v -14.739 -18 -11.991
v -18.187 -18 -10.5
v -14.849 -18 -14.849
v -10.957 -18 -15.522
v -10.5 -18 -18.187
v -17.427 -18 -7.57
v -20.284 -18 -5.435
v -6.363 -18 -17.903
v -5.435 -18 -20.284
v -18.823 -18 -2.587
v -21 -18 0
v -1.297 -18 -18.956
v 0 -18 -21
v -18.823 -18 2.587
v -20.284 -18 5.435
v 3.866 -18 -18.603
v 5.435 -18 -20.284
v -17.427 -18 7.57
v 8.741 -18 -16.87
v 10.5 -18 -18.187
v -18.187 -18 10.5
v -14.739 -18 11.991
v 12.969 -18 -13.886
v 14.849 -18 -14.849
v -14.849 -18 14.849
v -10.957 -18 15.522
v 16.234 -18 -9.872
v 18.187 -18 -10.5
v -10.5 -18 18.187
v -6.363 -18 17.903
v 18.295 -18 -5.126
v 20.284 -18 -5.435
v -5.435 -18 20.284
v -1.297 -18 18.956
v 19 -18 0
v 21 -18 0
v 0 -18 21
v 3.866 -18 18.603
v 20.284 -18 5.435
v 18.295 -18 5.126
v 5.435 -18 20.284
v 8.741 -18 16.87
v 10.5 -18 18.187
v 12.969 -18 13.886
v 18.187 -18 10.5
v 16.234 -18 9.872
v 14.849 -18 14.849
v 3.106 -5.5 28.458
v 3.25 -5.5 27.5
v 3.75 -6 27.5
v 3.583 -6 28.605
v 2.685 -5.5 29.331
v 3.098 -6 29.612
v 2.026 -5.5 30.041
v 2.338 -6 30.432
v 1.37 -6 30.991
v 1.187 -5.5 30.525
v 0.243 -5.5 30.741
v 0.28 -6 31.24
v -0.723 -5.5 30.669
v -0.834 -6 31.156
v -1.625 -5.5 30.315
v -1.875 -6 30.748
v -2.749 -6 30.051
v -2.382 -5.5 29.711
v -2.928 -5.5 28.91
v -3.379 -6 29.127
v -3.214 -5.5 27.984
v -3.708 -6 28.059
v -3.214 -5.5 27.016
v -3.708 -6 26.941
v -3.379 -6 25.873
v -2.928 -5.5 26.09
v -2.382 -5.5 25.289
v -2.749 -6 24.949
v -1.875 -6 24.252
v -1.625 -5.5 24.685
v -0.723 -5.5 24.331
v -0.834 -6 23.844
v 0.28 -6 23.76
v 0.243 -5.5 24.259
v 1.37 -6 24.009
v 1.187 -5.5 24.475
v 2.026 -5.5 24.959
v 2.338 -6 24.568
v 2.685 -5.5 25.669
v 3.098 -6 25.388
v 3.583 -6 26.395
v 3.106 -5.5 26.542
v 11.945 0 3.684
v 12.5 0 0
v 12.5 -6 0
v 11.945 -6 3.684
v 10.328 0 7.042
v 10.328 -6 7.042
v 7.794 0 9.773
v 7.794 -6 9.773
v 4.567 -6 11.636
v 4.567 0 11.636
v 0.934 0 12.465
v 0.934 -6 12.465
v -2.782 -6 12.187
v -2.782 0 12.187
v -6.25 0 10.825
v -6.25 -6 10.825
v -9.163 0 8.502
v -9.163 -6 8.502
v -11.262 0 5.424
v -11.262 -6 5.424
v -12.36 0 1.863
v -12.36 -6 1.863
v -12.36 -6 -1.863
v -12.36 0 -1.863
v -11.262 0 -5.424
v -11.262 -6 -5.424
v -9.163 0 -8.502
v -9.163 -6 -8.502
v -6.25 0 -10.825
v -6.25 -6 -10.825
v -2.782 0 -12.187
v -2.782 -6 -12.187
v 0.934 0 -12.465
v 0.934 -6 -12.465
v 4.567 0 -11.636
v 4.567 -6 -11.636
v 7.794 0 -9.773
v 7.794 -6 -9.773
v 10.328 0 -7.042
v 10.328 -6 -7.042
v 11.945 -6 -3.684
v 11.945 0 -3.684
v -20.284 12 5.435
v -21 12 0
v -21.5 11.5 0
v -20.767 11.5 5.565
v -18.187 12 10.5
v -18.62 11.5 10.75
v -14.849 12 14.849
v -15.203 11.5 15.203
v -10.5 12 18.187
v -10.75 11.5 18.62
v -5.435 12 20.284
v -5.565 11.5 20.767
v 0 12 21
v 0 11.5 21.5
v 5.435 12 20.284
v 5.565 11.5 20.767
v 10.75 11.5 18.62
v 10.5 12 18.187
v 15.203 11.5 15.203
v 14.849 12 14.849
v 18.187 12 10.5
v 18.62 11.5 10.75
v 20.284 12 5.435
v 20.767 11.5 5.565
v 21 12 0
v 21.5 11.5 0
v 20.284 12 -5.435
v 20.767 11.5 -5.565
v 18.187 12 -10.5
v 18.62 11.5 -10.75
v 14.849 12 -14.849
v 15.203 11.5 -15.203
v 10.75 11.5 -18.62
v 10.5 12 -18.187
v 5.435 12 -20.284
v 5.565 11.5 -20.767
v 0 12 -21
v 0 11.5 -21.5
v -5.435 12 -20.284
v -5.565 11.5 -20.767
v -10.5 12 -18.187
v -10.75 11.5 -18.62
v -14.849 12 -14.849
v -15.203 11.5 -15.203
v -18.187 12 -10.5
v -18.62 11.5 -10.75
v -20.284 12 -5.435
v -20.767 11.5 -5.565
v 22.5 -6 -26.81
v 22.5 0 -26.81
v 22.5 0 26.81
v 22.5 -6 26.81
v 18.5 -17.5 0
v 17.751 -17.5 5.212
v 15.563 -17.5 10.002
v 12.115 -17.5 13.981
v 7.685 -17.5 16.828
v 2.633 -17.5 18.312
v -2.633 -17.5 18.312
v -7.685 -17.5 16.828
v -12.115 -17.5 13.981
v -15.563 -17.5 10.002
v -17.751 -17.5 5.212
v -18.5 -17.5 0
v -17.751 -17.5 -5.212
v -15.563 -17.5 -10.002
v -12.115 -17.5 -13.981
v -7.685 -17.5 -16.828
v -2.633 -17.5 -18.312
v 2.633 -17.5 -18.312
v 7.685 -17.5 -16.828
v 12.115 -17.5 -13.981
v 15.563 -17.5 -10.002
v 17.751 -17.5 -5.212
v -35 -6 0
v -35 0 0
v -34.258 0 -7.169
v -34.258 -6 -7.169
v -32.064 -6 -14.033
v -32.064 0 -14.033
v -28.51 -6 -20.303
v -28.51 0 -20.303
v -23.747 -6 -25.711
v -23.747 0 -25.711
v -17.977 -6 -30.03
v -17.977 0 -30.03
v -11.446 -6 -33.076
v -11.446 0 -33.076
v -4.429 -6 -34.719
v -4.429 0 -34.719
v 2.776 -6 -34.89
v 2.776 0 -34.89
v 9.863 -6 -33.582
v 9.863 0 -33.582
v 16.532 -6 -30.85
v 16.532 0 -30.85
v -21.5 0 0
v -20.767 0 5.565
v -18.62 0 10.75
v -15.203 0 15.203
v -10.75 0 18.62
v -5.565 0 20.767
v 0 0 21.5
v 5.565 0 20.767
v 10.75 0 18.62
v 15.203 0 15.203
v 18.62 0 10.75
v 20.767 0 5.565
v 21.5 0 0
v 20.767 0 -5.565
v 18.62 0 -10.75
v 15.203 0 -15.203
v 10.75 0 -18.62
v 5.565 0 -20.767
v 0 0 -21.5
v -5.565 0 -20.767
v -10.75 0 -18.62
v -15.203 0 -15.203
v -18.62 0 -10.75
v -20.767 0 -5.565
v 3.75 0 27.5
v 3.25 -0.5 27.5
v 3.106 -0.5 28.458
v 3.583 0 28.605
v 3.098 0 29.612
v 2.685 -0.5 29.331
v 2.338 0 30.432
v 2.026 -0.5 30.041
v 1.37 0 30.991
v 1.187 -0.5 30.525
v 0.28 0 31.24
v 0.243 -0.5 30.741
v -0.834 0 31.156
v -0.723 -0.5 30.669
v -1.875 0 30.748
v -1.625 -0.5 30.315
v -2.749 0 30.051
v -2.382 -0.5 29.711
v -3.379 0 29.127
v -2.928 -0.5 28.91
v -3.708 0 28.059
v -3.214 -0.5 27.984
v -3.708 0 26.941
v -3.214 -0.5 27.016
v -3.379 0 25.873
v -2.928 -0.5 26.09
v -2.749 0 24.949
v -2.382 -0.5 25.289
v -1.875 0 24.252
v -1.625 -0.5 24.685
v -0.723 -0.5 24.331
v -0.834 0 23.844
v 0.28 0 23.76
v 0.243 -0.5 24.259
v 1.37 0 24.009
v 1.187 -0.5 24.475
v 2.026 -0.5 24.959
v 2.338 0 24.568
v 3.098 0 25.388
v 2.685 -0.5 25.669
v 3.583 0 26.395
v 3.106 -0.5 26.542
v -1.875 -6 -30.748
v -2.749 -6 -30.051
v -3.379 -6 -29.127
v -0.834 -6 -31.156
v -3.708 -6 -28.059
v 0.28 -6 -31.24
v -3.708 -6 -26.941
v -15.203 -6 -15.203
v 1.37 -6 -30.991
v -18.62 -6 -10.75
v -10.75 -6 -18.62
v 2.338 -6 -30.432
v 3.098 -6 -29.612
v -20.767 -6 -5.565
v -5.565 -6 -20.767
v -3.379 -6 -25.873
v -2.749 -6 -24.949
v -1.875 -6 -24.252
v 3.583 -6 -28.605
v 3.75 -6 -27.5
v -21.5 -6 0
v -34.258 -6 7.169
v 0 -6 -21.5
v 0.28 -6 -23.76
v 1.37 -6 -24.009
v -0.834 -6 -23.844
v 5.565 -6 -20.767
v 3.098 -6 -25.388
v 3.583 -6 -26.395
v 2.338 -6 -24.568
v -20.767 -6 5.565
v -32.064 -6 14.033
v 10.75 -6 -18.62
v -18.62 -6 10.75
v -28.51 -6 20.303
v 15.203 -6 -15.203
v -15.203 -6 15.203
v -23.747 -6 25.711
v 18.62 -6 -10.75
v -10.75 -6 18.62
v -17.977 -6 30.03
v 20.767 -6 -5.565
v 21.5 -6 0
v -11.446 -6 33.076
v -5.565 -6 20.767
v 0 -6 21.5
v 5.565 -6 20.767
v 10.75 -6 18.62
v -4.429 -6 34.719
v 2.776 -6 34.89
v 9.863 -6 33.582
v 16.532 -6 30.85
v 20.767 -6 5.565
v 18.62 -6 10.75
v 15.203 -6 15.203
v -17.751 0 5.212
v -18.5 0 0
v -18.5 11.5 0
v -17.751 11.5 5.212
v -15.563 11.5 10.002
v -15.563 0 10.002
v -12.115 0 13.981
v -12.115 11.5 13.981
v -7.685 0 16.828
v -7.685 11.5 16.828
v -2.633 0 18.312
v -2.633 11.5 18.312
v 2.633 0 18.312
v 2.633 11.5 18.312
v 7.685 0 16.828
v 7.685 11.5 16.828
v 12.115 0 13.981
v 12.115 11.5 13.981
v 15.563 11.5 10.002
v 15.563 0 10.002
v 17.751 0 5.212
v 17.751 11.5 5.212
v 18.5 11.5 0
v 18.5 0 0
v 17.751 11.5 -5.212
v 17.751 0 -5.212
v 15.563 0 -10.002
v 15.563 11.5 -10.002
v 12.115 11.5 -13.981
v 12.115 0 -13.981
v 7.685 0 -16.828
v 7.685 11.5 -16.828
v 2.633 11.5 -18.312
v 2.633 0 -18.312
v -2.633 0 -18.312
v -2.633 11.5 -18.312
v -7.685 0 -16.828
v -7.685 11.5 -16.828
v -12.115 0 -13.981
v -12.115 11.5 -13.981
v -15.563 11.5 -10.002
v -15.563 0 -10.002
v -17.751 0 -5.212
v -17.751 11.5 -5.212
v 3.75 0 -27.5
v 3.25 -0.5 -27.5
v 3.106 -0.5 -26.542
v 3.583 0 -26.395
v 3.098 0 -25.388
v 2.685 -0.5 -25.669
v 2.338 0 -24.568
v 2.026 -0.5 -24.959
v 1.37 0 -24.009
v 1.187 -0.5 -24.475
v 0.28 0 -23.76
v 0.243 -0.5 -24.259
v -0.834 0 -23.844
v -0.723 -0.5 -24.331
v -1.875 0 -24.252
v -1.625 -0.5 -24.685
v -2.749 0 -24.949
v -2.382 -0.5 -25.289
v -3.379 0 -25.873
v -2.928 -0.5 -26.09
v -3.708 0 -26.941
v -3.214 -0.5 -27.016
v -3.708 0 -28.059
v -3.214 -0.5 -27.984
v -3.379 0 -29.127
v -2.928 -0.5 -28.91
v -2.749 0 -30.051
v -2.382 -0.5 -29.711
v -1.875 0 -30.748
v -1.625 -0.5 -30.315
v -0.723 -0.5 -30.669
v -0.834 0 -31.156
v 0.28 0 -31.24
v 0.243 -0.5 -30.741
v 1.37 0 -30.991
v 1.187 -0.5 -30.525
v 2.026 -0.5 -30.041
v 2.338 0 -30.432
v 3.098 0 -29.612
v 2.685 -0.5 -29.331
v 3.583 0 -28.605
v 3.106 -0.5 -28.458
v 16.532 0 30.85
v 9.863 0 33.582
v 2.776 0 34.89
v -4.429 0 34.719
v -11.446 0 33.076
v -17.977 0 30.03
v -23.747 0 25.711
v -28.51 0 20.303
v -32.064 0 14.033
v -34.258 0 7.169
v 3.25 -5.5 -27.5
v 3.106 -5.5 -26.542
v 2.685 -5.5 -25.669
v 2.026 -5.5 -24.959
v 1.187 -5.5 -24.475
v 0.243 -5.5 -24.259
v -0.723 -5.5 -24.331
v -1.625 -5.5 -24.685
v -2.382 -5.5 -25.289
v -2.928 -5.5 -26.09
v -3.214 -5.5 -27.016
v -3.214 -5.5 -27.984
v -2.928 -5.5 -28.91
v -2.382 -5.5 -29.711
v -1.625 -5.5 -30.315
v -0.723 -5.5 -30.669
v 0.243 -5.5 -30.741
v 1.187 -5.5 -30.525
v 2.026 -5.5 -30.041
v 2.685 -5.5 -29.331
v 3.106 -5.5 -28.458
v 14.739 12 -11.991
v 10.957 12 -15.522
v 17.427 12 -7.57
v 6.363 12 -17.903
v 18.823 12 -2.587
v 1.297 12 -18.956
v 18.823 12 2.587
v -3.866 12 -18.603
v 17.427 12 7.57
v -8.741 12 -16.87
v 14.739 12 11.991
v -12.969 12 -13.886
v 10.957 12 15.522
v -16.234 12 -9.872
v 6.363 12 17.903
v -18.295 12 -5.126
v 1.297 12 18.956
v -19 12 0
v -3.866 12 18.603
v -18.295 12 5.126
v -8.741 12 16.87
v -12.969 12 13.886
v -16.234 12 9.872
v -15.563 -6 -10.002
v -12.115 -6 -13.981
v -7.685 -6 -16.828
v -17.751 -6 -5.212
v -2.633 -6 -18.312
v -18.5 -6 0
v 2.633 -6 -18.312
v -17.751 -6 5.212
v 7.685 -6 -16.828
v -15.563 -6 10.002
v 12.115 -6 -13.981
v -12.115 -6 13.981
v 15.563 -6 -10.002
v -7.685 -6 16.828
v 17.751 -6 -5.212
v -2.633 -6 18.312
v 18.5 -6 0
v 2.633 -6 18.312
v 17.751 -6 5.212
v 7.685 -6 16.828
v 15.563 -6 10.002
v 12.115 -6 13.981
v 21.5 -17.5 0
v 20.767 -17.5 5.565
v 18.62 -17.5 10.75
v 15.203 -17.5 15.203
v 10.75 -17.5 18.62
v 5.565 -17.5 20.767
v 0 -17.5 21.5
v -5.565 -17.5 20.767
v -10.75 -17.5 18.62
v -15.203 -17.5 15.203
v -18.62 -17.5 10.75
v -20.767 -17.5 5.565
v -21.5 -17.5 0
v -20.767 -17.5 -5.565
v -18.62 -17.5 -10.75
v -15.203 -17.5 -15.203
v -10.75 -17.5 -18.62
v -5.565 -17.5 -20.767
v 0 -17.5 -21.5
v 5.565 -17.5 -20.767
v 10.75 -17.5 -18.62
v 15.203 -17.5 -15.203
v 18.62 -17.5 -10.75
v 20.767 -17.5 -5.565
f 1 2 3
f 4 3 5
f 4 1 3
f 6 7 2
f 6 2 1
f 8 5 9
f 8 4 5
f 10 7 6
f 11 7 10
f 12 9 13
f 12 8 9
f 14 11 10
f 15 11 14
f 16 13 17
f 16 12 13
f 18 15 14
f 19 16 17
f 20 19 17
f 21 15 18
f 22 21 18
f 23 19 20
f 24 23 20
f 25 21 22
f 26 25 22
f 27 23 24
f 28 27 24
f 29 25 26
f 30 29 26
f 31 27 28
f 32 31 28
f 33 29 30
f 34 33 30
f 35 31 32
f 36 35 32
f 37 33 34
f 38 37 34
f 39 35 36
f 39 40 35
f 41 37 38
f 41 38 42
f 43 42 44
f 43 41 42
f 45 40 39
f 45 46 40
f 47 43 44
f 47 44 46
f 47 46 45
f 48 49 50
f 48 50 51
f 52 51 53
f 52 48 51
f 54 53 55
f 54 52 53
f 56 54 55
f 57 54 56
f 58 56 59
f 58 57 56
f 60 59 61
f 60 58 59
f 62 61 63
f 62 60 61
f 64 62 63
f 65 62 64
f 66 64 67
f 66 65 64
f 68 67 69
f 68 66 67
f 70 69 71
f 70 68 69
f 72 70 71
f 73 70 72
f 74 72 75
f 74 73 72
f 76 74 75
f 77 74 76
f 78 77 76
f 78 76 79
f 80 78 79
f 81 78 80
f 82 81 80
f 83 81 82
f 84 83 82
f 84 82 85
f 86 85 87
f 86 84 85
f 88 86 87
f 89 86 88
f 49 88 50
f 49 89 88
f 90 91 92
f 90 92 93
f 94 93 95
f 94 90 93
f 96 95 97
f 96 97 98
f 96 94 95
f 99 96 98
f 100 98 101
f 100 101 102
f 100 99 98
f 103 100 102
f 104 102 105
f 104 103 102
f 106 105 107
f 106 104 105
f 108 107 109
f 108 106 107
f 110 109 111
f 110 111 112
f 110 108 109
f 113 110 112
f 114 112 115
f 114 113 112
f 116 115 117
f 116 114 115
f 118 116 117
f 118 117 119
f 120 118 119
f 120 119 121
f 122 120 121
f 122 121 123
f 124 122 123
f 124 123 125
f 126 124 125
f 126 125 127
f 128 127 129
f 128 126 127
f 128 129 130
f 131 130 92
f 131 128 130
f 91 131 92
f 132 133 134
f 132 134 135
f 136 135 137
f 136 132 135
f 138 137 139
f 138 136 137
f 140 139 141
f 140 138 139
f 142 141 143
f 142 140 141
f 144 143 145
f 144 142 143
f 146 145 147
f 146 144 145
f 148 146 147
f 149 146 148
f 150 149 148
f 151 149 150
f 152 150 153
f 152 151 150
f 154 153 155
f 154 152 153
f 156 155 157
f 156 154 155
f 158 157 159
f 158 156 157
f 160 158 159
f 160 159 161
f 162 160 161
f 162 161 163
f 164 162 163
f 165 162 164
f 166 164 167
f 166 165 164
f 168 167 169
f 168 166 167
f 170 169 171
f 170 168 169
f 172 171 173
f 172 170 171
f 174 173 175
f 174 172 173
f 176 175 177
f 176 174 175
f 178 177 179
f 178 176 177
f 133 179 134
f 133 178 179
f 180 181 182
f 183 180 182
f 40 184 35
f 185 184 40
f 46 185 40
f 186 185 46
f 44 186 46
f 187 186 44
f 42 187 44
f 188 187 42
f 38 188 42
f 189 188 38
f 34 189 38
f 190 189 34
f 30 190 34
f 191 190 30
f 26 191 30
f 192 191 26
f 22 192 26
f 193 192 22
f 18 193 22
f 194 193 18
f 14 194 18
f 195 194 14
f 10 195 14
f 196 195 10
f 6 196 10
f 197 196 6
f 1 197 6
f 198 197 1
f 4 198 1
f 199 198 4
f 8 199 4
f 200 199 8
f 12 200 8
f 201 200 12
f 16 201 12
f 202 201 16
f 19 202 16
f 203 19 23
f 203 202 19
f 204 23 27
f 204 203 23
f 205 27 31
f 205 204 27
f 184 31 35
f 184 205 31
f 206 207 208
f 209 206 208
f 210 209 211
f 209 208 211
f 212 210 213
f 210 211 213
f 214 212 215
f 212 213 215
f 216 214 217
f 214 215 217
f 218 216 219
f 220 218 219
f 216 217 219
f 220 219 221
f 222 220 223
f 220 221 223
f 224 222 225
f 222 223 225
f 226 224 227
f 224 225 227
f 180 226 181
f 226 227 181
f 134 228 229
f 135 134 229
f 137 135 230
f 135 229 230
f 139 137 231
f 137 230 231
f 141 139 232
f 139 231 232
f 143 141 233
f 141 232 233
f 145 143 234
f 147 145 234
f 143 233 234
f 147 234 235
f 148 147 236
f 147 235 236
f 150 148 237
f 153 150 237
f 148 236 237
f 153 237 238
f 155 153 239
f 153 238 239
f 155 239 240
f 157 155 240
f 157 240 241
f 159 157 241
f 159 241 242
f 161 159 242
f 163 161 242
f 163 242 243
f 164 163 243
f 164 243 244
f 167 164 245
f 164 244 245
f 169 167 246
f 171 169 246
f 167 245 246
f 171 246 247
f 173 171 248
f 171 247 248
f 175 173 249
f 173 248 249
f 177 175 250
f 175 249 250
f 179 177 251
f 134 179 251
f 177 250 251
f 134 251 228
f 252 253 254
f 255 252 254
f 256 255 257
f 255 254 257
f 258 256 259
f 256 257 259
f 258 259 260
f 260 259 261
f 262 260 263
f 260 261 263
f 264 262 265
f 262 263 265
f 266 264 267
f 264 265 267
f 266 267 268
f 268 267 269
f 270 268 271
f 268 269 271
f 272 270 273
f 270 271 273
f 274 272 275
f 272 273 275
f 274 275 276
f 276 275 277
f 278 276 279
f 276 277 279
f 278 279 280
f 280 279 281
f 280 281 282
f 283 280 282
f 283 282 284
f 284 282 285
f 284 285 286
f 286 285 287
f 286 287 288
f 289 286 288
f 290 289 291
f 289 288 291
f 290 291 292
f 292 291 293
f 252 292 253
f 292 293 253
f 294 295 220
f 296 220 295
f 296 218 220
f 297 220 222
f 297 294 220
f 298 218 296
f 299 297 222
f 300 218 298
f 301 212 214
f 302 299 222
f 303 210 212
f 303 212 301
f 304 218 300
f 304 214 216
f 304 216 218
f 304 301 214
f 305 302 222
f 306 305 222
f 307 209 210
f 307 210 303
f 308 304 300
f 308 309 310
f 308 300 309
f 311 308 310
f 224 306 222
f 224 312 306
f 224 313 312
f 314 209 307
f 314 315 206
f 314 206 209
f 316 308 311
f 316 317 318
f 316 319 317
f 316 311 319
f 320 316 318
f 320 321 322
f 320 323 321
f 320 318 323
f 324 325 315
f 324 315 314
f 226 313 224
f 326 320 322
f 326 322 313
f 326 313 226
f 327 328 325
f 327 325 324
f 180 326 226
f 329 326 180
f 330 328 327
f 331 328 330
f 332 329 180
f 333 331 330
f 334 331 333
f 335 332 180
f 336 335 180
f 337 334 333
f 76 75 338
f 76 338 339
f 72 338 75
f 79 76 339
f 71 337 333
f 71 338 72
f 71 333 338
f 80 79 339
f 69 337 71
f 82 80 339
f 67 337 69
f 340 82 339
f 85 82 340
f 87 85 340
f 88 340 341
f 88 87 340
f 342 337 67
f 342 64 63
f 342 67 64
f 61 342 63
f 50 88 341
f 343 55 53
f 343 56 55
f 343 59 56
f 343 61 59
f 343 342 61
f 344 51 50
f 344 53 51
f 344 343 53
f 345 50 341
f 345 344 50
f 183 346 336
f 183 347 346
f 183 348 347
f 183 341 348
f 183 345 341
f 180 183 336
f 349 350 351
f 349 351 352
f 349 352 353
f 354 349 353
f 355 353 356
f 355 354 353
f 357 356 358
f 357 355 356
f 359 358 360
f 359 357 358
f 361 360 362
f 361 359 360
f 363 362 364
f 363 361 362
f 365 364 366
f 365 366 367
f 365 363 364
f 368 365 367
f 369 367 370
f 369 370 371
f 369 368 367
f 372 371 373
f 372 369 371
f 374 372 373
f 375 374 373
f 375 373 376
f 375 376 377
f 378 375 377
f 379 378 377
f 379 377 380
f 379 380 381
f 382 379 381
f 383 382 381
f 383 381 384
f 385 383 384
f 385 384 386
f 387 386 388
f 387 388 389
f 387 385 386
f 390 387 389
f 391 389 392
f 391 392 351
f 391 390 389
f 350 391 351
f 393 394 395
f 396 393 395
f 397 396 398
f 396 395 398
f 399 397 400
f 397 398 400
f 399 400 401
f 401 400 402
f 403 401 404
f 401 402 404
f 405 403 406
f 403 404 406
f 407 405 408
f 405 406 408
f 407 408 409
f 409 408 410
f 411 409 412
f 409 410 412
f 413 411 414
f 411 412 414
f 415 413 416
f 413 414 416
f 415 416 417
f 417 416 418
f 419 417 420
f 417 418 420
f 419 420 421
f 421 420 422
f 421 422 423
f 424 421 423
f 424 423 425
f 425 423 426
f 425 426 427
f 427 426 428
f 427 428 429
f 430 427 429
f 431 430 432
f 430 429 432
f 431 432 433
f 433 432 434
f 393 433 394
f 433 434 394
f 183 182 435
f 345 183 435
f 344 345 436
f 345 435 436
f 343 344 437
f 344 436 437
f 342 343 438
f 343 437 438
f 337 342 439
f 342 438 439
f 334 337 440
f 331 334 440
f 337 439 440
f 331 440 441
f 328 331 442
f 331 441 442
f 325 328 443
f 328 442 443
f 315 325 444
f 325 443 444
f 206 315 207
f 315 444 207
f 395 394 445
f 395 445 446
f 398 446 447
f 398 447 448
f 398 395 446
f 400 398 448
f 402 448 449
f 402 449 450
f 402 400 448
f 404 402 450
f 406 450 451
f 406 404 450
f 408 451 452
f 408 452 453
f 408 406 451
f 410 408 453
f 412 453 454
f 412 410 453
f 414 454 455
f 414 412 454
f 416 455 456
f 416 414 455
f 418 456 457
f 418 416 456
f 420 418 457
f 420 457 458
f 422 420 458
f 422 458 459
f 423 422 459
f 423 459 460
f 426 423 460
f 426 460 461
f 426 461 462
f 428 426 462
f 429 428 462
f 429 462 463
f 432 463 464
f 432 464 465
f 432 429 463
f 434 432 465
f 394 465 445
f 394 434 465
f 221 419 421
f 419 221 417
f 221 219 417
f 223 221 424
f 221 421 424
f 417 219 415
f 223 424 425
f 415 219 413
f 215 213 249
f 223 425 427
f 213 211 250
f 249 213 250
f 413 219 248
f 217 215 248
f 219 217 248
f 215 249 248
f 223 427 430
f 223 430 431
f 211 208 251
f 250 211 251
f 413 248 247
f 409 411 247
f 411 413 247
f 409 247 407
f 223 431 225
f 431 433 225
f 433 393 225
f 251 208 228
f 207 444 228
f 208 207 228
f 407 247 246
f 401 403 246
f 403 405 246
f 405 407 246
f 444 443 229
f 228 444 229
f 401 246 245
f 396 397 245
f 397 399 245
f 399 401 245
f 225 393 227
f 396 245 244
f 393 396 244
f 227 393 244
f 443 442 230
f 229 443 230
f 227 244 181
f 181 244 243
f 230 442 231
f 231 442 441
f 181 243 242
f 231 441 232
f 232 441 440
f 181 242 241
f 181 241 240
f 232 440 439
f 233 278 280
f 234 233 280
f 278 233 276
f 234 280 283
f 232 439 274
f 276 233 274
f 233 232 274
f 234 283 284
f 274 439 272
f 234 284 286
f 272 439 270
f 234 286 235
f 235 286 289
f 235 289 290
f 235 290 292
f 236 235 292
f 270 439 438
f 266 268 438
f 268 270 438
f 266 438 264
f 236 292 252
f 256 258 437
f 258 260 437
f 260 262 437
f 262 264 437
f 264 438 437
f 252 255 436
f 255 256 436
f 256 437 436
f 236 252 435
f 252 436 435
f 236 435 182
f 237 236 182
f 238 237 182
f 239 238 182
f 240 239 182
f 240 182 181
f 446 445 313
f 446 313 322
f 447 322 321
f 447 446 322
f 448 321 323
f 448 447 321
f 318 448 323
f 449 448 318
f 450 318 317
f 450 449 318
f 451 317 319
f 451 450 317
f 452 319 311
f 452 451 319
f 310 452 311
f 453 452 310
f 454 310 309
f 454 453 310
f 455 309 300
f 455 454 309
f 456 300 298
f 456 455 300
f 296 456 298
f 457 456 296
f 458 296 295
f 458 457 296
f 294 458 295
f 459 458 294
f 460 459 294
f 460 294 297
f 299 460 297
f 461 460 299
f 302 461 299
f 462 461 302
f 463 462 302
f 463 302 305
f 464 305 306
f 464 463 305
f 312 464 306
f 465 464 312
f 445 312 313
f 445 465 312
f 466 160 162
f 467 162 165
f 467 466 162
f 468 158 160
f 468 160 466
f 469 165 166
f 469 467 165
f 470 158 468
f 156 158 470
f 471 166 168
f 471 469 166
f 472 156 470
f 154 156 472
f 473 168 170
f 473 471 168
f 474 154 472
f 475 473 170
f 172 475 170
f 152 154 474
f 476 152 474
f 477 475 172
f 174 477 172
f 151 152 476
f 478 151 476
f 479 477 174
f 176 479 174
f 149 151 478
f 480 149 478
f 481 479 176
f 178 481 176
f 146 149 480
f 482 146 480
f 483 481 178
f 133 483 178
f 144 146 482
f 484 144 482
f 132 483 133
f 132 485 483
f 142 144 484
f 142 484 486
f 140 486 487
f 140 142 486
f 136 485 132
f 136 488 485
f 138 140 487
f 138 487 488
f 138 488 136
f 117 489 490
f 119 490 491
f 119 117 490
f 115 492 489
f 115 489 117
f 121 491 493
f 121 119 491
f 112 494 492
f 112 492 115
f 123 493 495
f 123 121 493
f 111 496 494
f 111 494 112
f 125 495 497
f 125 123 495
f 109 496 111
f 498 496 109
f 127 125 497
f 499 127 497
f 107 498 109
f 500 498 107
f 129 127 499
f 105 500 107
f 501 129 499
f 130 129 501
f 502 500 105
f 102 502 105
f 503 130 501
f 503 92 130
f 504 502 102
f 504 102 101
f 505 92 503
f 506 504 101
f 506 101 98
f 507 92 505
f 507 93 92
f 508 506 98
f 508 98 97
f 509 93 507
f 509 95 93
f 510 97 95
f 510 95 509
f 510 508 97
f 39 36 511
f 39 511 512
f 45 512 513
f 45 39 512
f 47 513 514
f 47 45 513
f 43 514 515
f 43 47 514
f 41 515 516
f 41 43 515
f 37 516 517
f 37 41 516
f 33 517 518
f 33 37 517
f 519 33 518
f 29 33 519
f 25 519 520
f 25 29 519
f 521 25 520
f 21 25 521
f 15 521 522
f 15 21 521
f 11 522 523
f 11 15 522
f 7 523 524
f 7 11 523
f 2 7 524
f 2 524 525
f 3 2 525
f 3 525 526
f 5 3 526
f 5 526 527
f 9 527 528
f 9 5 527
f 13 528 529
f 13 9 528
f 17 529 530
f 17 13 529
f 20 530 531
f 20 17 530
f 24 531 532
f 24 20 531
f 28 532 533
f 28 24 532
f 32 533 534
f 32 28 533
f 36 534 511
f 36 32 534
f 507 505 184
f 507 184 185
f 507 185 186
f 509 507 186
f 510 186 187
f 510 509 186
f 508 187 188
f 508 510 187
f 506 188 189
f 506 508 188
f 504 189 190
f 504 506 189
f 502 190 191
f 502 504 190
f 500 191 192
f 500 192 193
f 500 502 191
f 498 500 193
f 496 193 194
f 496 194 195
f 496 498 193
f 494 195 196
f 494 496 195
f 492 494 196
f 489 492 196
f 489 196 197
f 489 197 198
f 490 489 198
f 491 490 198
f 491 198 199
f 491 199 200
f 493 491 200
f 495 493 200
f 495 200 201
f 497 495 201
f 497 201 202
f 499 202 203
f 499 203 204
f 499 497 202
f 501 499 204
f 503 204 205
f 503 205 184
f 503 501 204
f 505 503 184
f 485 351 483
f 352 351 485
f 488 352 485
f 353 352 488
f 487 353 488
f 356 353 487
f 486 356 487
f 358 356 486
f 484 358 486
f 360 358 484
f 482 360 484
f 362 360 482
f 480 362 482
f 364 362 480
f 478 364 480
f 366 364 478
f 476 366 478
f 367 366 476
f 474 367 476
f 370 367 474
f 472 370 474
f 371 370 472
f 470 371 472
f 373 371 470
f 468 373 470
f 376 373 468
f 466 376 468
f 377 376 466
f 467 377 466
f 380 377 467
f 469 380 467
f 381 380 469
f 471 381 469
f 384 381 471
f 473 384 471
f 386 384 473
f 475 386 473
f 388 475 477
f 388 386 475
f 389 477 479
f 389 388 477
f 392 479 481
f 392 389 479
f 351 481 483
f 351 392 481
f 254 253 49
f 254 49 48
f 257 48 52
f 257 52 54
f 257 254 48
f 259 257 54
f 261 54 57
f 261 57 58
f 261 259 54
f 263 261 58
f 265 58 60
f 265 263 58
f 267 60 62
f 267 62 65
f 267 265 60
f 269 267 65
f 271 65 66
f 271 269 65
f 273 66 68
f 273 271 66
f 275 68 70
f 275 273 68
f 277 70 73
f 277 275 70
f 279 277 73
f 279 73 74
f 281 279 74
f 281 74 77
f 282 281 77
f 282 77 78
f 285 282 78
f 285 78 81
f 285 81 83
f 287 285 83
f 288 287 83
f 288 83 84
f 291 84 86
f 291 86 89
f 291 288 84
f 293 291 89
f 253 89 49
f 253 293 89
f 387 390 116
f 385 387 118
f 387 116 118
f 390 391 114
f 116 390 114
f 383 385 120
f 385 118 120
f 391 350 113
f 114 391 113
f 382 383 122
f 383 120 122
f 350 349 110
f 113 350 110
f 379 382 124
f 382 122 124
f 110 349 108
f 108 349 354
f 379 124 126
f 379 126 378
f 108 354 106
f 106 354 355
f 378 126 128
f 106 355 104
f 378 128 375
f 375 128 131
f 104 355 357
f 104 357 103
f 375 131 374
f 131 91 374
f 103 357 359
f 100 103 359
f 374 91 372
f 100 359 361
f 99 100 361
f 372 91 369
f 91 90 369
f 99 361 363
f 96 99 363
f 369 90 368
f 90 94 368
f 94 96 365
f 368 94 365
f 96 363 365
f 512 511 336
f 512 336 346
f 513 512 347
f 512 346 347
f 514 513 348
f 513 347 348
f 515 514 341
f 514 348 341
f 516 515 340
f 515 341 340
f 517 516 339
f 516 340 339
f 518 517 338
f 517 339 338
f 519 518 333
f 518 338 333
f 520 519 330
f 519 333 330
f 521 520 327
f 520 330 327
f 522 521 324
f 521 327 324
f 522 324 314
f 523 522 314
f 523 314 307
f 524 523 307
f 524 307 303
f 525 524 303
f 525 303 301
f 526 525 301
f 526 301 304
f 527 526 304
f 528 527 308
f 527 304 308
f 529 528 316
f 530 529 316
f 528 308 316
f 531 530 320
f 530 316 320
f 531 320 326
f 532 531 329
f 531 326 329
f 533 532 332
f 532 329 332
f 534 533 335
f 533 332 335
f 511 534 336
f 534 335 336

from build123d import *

# Parameters (mm, degrees)
F0_R     = 3.25
F0_R_2   = 12.5
F1_DEPTH = 6
F2_R     = 21.5
F2_R_2   = 18.5
F3_DEPTH = 12
F4_R     = 21.5
F4_R_2   = 18.5
F5_DEPTH = 12
F6_SIZE  = 0.5


with BuildPart() as f1:
    # F0 (on Front) → F1 (new body)
    with BuildSketch(Plane.XZ):
        with BuildLine():
            Line((22.5, -26.809513), (22.5, 26.809513))
            ThreePointArc((22.5, 26.809513), (-14.790199, 31.721444), (-35, 0))
            ThreePointArc((-35, 0), (-14.790199, -31.721444), (22.5, -26.809513))
        make_face()
        with Locations((0, -27.5)):
            Circle(F0_R, mode=Mode.SUBTRACT)
        Circle(F0_R_2, mode=Mode.SUBTRACT)
        with Locations((0, 27.5)):
            Circle(F0_R, mode=Mode.SUBTRACT)
    extrude(amount=F1_DEPTH)

    # F2 (on face) → F3 (join)
    with BuildSketch(Plane.XZ.offset(6)):
        Circle(F2_R)
        Circle(F2_R_2, mode=Mode.SUBTRACT)
    extrude(amount=F3_DEPTH)

    # F4 (on face) → F5 (join)
    with BuildSketch(Plane(origin=(0, 0, 0), x_dir=(-1, 0, 0), z_dir=(0, 1, 0))):
        Circle(F4_R)
        Circle(F4_R_2, mode=Mode.SUBTRACT)
    extrude(amount=F5_DEPTH)

    # F6
    f6_edges = [f1.edges().sort_by_distance(p)[0] for p in [
        (-3.25, -6, 27.5),
        (-3.25, 0, 27.5),
        (-3.25, -6, -27.5),
        (-3.25, 0, -27.5),
        (18.5, 12, 0),
        (21.5, 12, 0),
        (-21.5, -18, 0),
        (-18.5, -18, 0),
    ]]
    chamfer(f6_edges, length=F6_SIZE)


solid = f1.part
